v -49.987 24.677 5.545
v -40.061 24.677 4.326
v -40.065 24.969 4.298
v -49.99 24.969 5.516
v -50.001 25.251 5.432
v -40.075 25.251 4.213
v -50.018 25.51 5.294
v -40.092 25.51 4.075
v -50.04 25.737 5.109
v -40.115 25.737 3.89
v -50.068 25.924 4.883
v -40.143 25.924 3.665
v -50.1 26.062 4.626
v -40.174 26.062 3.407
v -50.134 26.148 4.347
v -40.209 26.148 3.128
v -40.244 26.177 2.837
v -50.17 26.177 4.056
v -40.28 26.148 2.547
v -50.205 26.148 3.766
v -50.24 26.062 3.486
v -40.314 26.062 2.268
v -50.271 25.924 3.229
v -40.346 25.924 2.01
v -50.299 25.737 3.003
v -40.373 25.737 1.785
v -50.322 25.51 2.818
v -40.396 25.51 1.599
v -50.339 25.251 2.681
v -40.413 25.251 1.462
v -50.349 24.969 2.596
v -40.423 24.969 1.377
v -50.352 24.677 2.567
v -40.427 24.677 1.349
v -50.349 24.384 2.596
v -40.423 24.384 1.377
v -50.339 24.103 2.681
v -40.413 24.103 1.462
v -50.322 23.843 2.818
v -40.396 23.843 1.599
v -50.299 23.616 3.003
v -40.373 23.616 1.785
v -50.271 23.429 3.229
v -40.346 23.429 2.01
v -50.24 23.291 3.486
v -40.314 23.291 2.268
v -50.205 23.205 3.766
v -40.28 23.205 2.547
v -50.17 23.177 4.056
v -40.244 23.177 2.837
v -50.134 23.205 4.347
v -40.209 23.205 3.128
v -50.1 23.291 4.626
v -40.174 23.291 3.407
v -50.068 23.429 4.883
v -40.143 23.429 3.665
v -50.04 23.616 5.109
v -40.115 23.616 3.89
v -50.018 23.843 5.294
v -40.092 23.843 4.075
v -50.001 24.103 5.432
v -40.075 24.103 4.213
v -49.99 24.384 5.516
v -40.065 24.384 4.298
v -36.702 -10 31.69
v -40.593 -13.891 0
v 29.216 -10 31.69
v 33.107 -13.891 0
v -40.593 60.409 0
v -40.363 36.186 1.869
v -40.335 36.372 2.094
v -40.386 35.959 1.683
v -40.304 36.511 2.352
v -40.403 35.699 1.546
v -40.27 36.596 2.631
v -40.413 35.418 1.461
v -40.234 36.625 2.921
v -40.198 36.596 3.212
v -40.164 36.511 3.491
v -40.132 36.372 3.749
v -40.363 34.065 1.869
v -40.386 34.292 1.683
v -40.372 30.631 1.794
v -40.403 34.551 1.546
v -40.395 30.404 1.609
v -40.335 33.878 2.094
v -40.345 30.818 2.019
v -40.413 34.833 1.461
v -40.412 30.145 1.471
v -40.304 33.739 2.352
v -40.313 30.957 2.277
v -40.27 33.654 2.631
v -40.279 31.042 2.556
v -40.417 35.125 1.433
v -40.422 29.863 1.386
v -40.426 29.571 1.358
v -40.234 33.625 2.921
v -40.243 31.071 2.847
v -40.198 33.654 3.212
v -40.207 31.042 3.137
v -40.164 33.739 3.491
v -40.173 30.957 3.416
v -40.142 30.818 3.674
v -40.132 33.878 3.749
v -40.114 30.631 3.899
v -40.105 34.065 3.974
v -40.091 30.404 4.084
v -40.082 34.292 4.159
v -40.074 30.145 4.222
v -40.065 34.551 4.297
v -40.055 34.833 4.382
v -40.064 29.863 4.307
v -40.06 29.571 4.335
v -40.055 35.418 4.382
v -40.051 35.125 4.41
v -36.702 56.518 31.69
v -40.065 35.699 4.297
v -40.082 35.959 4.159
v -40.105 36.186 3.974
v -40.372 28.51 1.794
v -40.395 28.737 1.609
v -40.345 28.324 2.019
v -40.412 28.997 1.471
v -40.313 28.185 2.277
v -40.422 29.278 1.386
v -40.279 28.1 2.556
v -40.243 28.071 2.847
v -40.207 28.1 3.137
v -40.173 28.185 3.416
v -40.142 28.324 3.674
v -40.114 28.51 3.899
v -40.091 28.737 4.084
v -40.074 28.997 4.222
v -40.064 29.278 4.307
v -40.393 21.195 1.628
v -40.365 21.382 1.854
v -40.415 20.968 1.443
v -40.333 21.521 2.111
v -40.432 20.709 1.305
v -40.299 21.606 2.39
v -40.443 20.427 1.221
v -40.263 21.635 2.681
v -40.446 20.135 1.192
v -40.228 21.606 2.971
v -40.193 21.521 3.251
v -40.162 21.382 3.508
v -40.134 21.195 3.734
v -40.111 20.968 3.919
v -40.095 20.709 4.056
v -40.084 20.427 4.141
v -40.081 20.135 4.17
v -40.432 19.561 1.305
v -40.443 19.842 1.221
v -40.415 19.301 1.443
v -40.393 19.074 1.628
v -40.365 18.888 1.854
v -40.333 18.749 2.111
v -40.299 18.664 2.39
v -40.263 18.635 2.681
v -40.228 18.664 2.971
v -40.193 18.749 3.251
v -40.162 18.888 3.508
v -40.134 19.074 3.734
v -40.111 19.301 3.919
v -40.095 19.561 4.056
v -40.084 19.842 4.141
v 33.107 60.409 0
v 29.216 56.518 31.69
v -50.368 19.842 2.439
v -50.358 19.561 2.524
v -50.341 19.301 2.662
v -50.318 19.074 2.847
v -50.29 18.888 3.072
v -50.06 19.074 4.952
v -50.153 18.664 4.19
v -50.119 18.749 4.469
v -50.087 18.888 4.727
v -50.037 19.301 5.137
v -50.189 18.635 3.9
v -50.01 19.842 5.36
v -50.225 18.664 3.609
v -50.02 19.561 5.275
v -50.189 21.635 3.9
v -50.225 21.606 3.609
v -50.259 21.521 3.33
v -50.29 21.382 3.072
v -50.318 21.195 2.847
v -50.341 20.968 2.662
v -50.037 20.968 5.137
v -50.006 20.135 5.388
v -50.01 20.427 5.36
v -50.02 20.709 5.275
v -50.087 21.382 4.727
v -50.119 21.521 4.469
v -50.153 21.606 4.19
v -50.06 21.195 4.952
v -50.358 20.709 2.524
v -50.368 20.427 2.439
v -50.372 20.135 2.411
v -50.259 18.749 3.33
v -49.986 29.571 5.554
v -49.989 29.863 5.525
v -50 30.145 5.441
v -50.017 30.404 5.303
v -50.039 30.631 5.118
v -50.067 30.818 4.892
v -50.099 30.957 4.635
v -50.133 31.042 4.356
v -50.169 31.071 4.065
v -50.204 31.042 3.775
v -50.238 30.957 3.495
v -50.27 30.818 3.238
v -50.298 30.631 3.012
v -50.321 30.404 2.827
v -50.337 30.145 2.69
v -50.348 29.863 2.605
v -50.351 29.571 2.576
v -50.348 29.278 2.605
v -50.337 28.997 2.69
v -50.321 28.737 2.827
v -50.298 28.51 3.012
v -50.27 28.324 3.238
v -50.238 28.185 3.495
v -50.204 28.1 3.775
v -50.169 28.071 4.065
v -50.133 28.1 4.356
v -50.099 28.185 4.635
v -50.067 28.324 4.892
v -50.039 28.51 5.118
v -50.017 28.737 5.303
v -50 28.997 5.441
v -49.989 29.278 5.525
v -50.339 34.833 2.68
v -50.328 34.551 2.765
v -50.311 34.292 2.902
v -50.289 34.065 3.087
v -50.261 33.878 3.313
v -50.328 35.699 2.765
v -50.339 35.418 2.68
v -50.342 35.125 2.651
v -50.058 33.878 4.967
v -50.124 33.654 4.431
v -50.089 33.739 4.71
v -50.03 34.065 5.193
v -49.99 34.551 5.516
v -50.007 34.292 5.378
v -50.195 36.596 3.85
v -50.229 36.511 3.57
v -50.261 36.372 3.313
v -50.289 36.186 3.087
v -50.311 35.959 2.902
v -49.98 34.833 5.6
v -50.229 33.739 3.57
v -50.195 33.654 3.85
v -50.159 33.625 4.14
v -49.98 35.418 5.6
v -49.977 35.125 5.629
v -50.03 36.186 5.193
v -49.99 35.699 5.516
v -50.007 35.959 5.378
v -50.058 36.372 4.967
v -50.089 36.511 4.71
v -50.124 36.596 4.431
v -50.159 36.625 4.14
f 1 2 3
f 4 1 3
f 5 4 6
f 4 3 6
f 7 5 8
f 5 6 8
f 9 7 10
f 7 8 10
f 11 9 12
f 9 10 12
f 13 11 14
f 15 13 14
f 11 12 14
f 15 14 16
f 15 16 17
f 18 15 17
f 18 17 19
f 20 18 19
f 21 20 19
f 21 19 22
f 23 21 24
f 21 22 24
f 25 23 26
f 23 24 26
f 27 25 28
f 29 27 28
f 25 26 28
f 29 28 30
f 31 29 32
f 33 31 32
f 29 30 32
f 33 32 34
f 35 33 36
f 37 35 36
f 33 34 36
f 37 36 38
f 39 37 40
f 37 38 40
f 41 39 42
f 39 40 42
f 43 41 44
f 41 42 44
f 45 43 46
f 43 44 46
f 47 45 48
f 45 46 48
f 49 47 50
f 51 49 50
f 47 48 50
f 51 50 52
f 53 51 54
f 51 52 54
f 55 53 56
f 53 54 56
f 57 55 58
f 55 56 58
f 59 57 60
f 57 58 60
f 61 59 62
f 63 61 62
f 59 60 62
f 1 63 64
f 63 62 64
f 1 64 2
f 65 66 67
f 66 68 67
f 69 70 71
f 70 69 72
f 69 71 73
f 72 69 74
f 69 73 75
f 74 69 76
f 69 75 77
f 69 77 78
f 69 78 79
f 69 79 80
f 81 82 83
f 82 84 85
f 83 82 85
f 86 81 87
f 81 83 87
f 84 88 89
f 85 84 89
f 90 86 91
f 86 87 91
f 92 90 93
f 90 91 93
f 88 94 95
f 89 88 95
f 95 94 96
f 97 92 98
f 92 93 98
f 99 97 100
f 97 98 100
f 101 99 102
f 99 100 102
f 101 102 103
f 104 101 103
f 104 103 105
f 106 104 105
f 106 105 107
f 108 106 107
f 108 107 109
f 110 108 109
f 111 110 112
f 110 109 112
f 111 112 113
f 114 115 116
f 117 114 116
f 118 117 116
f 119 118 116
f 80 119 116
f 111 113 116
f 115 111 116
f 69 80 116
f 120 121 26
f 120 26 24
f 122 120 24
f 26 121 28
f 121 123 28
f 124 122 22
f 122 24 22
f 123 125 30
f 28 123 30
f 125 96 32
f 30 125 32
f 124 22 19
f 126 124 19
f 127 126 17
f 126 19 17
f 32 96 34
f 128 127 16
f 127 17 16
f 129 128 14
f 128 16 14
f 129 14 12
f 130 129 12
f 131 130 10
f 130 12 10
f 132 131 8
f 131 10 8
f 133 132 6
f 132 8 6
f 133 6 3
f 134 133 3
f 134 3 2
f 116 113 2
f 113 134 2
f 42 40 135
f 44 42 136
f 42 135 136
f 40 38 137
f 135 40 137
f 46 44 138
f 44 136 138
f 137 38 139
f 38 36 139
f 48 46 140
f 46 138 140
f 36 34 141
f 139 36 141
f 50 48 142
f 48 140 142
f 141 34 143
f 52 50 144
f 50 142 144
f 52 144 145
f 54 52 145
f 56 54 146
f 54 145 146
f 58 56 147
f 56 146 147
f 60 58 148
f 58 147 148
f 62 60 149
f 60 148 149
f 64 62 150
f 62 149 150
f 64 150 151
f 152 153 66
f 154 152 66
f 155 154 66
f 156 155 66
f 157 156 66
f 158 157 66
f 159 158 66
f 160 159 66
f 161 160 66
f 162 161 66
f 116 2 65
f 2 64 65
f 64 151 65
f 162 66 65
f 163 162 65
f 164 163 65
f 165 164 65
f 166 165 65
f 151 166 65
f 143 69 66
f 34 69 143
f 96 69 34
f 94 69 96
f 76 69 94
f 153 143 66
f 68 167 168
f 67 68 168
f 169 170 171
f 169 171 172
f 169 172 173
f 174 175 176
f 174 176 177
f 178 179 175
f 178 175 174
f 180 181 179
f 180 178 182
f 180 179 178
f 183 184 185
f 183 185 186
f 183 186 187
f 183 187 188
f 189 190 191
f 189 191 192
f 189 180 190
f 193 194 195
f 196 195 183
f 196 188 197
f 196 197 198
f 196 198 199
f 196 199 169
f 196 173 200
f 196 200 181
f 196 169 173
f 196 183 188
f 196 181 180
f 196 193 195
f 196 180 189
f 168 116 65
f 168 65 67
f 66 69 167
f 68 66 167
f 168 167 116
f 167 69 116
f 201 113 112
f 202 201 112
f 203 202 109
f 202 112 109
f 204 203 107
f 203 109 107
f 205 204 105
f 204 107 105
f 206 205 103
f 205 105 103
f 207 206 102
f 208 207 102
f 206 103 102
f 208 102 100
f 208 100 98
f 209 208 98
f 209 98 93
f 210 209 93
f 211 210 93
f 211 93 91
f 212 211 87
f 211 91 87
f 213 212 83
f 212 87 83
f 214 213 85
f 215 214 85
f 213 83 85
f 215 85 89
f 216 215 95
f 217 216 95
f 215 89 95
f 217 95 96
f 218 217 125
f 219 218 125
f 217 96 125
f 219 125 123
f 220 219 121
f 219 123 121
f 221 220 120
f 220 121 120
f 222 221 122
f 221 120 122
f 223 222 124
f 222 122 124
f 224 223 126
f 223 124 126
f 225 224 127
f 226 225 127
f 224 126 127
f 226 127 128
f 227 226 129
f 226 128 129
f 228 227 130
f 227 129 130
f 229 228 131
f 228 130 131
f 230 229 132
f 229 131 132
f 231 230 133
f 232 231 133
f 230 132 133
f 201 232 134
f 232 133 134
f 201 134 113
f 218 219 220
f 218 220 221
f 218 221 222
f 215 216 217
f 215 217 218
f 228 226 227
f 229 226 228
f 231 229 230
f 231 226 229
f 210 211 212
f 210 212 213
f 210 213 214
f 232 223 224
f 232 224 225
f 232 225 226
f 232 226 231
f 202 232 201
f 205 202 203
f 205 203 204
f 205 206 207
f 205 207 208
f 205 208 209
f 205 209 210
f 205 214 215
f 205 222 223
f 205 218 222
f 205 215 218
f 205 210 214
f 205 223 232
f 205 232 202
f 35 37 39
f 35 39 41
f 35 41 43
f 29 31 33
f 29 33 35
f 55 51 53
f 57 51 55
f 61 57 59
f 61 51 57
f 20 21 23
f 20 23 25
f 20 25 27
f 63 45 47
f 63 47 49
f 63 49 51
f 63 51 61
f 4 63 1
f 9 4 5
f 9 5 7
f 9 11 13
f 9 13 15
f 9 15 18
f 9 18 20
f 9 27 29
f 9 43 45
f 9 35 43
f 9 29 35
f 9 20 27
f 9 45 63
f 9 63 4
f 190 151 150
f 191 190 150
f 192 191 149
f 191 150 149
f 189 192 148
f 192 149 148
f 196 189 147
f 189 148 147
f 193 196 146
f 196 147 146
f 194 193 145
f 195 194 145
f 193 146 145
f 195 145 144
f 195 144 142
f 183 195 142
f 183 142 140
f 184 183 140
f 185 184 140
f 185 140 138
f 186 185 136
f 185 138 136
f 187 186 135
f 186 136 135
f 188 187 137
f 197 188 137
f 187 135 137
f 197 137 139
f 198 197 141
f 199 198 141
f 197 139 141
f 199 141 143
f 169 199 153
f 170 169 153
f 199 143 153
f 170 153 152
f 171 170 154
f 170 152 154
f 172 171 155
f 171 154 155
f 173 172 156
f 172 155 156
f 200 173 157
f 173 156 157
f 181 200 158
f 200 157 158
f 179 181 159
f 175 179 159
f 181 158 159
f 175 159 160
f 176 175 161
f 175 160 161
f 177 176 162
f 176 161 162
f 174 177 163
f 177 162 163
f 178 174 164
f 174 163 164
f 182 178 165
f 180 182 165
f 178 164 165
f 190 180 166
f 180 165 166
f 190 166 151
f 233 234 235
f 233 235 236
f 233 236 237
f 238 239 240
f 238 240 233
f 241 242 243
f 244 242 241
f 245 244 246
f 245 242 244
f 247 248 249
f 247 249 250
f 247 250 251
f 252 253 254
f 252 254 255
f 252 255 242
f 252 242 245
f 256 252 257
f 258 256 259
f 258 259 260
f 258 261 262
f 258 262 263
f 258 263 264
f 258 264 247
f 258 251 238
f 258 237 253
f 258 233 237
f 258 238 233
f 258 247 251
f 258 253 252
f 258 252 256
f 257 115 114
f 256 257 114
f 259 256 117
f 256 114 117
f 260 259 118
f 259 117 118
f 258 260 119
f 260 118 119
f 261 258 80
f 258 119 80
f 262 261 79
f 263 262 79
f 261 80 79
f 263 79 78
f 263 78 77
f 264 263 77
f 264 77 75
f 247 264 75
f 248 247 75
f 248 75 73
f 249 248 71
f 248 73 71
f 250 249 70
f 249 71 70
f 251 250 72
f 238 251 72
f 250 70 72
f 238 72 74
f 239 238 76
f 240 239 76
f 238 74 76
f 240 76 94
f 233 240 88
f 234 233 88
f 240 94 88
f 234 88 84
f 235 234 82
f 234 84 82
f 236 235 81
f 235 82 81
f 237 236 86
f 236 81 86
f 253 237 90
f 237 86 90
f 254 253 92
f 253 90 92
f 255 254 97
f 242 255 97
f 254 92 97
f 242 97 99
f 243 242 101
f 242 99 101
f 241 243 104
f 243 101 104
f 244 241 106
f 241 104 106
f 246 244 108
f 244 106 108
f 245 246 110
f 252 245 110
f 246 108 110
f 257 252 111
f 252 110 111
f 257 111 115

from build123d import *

# Parameters (mm, degrees)
SKETCH1_W           = 73.7
SKETCH1_H           = 74.3
BOSS_EXTRUDE1_DEPTH = 31.69
BOSS_EXTRUDE1_TAPER = 7
SKETCH2_R           = 1.5
BOSS_EXTRUDE2_DEPTH = 10
SKETCH3_R           = 1.5
BOSS_EXTRUDE3_DEPTH = 10
SKETCH4_R           = 1.5
BOSS_EXTRUDE4_DEPTH = 10
SKETCH5_R           = 1.5
BOSS_EXTRUDE5_DEPTH = 10


with BuildPart() as part:
    # Sketch1 → Boss-Extrude1 (new body)
    with BuildSketch(Plane.XY):
        with Locations((-3.742578125, 23.259277344)):
            Rectangle(SKETCH1_W, SKETCH1_H)
    extrude(amount=BOSS_EXTRUDE1_DEPTH, taper=BOSS_EXTRUDE1_TAPER)

    # Sketch2 → Boss-Extrude2 (add)
    with BuildSketch(Plane(origin=(-39.989691599, 0, 4.910116724), x_dir=(0.1218693434051475, 0, 0.992546151641322), z_dir=(-0.992546151641322, 0, 0.1218693434051475))):
        with Locations((-2.003690491, 35.125279491)):
            Circle(SKETCH2_R)
    extrude(amount=BOSS_EXTRUDE2_DEPTH)

    # Sketch3 → Boss-Extrude3 (add)
    with BuildSketch(Plane(origin=(-39.989691599, 0, 4.910116724), x_dir=(0.1218693434051475, 0, 0.992546151641322), z_dir=(-0.992546151641322, 0, 0.1218693434051475))):
        with Locations((-2.079096661, 29.570839743)):
            Circle(SKETCH3_R)
    extrude(amount=BOSS_EXTRUDE3_DEPTH)

    # Sketch4 → Boss-Extrude4 (add)
    with BuildSketch(Plane(origin=(-39.989691599, 0, 4.910116724), x_dir=(0.1218693434051475, 0, 0.992546151641322), z_dir=(-0.992546151641322, 0, 0.1218693434051475))):
        with Locations((-2.088291419, 24.676586011)):
            Circle(SKETCH4_R)
    extrude(amount=BOSS_EXTRUDE4_DEPTH)

    # Sketch5 → Boss-Extrude5 (add)
    with BuildSketch(Plane(origin=(-39.989691599, 0, 4.910116724), x_dir=(0.1218693434051475, 0, 0.992546151641322), z_dir=(-0.992546151641322, 0, 0.1218693434051475))):
        with Locations((-2.246014271, 20.134764101)):
            Circle(SKETCH5_R)
    extrude(amount=BOSS_EXTRUDE5_DEPTH)


solid = part.part
